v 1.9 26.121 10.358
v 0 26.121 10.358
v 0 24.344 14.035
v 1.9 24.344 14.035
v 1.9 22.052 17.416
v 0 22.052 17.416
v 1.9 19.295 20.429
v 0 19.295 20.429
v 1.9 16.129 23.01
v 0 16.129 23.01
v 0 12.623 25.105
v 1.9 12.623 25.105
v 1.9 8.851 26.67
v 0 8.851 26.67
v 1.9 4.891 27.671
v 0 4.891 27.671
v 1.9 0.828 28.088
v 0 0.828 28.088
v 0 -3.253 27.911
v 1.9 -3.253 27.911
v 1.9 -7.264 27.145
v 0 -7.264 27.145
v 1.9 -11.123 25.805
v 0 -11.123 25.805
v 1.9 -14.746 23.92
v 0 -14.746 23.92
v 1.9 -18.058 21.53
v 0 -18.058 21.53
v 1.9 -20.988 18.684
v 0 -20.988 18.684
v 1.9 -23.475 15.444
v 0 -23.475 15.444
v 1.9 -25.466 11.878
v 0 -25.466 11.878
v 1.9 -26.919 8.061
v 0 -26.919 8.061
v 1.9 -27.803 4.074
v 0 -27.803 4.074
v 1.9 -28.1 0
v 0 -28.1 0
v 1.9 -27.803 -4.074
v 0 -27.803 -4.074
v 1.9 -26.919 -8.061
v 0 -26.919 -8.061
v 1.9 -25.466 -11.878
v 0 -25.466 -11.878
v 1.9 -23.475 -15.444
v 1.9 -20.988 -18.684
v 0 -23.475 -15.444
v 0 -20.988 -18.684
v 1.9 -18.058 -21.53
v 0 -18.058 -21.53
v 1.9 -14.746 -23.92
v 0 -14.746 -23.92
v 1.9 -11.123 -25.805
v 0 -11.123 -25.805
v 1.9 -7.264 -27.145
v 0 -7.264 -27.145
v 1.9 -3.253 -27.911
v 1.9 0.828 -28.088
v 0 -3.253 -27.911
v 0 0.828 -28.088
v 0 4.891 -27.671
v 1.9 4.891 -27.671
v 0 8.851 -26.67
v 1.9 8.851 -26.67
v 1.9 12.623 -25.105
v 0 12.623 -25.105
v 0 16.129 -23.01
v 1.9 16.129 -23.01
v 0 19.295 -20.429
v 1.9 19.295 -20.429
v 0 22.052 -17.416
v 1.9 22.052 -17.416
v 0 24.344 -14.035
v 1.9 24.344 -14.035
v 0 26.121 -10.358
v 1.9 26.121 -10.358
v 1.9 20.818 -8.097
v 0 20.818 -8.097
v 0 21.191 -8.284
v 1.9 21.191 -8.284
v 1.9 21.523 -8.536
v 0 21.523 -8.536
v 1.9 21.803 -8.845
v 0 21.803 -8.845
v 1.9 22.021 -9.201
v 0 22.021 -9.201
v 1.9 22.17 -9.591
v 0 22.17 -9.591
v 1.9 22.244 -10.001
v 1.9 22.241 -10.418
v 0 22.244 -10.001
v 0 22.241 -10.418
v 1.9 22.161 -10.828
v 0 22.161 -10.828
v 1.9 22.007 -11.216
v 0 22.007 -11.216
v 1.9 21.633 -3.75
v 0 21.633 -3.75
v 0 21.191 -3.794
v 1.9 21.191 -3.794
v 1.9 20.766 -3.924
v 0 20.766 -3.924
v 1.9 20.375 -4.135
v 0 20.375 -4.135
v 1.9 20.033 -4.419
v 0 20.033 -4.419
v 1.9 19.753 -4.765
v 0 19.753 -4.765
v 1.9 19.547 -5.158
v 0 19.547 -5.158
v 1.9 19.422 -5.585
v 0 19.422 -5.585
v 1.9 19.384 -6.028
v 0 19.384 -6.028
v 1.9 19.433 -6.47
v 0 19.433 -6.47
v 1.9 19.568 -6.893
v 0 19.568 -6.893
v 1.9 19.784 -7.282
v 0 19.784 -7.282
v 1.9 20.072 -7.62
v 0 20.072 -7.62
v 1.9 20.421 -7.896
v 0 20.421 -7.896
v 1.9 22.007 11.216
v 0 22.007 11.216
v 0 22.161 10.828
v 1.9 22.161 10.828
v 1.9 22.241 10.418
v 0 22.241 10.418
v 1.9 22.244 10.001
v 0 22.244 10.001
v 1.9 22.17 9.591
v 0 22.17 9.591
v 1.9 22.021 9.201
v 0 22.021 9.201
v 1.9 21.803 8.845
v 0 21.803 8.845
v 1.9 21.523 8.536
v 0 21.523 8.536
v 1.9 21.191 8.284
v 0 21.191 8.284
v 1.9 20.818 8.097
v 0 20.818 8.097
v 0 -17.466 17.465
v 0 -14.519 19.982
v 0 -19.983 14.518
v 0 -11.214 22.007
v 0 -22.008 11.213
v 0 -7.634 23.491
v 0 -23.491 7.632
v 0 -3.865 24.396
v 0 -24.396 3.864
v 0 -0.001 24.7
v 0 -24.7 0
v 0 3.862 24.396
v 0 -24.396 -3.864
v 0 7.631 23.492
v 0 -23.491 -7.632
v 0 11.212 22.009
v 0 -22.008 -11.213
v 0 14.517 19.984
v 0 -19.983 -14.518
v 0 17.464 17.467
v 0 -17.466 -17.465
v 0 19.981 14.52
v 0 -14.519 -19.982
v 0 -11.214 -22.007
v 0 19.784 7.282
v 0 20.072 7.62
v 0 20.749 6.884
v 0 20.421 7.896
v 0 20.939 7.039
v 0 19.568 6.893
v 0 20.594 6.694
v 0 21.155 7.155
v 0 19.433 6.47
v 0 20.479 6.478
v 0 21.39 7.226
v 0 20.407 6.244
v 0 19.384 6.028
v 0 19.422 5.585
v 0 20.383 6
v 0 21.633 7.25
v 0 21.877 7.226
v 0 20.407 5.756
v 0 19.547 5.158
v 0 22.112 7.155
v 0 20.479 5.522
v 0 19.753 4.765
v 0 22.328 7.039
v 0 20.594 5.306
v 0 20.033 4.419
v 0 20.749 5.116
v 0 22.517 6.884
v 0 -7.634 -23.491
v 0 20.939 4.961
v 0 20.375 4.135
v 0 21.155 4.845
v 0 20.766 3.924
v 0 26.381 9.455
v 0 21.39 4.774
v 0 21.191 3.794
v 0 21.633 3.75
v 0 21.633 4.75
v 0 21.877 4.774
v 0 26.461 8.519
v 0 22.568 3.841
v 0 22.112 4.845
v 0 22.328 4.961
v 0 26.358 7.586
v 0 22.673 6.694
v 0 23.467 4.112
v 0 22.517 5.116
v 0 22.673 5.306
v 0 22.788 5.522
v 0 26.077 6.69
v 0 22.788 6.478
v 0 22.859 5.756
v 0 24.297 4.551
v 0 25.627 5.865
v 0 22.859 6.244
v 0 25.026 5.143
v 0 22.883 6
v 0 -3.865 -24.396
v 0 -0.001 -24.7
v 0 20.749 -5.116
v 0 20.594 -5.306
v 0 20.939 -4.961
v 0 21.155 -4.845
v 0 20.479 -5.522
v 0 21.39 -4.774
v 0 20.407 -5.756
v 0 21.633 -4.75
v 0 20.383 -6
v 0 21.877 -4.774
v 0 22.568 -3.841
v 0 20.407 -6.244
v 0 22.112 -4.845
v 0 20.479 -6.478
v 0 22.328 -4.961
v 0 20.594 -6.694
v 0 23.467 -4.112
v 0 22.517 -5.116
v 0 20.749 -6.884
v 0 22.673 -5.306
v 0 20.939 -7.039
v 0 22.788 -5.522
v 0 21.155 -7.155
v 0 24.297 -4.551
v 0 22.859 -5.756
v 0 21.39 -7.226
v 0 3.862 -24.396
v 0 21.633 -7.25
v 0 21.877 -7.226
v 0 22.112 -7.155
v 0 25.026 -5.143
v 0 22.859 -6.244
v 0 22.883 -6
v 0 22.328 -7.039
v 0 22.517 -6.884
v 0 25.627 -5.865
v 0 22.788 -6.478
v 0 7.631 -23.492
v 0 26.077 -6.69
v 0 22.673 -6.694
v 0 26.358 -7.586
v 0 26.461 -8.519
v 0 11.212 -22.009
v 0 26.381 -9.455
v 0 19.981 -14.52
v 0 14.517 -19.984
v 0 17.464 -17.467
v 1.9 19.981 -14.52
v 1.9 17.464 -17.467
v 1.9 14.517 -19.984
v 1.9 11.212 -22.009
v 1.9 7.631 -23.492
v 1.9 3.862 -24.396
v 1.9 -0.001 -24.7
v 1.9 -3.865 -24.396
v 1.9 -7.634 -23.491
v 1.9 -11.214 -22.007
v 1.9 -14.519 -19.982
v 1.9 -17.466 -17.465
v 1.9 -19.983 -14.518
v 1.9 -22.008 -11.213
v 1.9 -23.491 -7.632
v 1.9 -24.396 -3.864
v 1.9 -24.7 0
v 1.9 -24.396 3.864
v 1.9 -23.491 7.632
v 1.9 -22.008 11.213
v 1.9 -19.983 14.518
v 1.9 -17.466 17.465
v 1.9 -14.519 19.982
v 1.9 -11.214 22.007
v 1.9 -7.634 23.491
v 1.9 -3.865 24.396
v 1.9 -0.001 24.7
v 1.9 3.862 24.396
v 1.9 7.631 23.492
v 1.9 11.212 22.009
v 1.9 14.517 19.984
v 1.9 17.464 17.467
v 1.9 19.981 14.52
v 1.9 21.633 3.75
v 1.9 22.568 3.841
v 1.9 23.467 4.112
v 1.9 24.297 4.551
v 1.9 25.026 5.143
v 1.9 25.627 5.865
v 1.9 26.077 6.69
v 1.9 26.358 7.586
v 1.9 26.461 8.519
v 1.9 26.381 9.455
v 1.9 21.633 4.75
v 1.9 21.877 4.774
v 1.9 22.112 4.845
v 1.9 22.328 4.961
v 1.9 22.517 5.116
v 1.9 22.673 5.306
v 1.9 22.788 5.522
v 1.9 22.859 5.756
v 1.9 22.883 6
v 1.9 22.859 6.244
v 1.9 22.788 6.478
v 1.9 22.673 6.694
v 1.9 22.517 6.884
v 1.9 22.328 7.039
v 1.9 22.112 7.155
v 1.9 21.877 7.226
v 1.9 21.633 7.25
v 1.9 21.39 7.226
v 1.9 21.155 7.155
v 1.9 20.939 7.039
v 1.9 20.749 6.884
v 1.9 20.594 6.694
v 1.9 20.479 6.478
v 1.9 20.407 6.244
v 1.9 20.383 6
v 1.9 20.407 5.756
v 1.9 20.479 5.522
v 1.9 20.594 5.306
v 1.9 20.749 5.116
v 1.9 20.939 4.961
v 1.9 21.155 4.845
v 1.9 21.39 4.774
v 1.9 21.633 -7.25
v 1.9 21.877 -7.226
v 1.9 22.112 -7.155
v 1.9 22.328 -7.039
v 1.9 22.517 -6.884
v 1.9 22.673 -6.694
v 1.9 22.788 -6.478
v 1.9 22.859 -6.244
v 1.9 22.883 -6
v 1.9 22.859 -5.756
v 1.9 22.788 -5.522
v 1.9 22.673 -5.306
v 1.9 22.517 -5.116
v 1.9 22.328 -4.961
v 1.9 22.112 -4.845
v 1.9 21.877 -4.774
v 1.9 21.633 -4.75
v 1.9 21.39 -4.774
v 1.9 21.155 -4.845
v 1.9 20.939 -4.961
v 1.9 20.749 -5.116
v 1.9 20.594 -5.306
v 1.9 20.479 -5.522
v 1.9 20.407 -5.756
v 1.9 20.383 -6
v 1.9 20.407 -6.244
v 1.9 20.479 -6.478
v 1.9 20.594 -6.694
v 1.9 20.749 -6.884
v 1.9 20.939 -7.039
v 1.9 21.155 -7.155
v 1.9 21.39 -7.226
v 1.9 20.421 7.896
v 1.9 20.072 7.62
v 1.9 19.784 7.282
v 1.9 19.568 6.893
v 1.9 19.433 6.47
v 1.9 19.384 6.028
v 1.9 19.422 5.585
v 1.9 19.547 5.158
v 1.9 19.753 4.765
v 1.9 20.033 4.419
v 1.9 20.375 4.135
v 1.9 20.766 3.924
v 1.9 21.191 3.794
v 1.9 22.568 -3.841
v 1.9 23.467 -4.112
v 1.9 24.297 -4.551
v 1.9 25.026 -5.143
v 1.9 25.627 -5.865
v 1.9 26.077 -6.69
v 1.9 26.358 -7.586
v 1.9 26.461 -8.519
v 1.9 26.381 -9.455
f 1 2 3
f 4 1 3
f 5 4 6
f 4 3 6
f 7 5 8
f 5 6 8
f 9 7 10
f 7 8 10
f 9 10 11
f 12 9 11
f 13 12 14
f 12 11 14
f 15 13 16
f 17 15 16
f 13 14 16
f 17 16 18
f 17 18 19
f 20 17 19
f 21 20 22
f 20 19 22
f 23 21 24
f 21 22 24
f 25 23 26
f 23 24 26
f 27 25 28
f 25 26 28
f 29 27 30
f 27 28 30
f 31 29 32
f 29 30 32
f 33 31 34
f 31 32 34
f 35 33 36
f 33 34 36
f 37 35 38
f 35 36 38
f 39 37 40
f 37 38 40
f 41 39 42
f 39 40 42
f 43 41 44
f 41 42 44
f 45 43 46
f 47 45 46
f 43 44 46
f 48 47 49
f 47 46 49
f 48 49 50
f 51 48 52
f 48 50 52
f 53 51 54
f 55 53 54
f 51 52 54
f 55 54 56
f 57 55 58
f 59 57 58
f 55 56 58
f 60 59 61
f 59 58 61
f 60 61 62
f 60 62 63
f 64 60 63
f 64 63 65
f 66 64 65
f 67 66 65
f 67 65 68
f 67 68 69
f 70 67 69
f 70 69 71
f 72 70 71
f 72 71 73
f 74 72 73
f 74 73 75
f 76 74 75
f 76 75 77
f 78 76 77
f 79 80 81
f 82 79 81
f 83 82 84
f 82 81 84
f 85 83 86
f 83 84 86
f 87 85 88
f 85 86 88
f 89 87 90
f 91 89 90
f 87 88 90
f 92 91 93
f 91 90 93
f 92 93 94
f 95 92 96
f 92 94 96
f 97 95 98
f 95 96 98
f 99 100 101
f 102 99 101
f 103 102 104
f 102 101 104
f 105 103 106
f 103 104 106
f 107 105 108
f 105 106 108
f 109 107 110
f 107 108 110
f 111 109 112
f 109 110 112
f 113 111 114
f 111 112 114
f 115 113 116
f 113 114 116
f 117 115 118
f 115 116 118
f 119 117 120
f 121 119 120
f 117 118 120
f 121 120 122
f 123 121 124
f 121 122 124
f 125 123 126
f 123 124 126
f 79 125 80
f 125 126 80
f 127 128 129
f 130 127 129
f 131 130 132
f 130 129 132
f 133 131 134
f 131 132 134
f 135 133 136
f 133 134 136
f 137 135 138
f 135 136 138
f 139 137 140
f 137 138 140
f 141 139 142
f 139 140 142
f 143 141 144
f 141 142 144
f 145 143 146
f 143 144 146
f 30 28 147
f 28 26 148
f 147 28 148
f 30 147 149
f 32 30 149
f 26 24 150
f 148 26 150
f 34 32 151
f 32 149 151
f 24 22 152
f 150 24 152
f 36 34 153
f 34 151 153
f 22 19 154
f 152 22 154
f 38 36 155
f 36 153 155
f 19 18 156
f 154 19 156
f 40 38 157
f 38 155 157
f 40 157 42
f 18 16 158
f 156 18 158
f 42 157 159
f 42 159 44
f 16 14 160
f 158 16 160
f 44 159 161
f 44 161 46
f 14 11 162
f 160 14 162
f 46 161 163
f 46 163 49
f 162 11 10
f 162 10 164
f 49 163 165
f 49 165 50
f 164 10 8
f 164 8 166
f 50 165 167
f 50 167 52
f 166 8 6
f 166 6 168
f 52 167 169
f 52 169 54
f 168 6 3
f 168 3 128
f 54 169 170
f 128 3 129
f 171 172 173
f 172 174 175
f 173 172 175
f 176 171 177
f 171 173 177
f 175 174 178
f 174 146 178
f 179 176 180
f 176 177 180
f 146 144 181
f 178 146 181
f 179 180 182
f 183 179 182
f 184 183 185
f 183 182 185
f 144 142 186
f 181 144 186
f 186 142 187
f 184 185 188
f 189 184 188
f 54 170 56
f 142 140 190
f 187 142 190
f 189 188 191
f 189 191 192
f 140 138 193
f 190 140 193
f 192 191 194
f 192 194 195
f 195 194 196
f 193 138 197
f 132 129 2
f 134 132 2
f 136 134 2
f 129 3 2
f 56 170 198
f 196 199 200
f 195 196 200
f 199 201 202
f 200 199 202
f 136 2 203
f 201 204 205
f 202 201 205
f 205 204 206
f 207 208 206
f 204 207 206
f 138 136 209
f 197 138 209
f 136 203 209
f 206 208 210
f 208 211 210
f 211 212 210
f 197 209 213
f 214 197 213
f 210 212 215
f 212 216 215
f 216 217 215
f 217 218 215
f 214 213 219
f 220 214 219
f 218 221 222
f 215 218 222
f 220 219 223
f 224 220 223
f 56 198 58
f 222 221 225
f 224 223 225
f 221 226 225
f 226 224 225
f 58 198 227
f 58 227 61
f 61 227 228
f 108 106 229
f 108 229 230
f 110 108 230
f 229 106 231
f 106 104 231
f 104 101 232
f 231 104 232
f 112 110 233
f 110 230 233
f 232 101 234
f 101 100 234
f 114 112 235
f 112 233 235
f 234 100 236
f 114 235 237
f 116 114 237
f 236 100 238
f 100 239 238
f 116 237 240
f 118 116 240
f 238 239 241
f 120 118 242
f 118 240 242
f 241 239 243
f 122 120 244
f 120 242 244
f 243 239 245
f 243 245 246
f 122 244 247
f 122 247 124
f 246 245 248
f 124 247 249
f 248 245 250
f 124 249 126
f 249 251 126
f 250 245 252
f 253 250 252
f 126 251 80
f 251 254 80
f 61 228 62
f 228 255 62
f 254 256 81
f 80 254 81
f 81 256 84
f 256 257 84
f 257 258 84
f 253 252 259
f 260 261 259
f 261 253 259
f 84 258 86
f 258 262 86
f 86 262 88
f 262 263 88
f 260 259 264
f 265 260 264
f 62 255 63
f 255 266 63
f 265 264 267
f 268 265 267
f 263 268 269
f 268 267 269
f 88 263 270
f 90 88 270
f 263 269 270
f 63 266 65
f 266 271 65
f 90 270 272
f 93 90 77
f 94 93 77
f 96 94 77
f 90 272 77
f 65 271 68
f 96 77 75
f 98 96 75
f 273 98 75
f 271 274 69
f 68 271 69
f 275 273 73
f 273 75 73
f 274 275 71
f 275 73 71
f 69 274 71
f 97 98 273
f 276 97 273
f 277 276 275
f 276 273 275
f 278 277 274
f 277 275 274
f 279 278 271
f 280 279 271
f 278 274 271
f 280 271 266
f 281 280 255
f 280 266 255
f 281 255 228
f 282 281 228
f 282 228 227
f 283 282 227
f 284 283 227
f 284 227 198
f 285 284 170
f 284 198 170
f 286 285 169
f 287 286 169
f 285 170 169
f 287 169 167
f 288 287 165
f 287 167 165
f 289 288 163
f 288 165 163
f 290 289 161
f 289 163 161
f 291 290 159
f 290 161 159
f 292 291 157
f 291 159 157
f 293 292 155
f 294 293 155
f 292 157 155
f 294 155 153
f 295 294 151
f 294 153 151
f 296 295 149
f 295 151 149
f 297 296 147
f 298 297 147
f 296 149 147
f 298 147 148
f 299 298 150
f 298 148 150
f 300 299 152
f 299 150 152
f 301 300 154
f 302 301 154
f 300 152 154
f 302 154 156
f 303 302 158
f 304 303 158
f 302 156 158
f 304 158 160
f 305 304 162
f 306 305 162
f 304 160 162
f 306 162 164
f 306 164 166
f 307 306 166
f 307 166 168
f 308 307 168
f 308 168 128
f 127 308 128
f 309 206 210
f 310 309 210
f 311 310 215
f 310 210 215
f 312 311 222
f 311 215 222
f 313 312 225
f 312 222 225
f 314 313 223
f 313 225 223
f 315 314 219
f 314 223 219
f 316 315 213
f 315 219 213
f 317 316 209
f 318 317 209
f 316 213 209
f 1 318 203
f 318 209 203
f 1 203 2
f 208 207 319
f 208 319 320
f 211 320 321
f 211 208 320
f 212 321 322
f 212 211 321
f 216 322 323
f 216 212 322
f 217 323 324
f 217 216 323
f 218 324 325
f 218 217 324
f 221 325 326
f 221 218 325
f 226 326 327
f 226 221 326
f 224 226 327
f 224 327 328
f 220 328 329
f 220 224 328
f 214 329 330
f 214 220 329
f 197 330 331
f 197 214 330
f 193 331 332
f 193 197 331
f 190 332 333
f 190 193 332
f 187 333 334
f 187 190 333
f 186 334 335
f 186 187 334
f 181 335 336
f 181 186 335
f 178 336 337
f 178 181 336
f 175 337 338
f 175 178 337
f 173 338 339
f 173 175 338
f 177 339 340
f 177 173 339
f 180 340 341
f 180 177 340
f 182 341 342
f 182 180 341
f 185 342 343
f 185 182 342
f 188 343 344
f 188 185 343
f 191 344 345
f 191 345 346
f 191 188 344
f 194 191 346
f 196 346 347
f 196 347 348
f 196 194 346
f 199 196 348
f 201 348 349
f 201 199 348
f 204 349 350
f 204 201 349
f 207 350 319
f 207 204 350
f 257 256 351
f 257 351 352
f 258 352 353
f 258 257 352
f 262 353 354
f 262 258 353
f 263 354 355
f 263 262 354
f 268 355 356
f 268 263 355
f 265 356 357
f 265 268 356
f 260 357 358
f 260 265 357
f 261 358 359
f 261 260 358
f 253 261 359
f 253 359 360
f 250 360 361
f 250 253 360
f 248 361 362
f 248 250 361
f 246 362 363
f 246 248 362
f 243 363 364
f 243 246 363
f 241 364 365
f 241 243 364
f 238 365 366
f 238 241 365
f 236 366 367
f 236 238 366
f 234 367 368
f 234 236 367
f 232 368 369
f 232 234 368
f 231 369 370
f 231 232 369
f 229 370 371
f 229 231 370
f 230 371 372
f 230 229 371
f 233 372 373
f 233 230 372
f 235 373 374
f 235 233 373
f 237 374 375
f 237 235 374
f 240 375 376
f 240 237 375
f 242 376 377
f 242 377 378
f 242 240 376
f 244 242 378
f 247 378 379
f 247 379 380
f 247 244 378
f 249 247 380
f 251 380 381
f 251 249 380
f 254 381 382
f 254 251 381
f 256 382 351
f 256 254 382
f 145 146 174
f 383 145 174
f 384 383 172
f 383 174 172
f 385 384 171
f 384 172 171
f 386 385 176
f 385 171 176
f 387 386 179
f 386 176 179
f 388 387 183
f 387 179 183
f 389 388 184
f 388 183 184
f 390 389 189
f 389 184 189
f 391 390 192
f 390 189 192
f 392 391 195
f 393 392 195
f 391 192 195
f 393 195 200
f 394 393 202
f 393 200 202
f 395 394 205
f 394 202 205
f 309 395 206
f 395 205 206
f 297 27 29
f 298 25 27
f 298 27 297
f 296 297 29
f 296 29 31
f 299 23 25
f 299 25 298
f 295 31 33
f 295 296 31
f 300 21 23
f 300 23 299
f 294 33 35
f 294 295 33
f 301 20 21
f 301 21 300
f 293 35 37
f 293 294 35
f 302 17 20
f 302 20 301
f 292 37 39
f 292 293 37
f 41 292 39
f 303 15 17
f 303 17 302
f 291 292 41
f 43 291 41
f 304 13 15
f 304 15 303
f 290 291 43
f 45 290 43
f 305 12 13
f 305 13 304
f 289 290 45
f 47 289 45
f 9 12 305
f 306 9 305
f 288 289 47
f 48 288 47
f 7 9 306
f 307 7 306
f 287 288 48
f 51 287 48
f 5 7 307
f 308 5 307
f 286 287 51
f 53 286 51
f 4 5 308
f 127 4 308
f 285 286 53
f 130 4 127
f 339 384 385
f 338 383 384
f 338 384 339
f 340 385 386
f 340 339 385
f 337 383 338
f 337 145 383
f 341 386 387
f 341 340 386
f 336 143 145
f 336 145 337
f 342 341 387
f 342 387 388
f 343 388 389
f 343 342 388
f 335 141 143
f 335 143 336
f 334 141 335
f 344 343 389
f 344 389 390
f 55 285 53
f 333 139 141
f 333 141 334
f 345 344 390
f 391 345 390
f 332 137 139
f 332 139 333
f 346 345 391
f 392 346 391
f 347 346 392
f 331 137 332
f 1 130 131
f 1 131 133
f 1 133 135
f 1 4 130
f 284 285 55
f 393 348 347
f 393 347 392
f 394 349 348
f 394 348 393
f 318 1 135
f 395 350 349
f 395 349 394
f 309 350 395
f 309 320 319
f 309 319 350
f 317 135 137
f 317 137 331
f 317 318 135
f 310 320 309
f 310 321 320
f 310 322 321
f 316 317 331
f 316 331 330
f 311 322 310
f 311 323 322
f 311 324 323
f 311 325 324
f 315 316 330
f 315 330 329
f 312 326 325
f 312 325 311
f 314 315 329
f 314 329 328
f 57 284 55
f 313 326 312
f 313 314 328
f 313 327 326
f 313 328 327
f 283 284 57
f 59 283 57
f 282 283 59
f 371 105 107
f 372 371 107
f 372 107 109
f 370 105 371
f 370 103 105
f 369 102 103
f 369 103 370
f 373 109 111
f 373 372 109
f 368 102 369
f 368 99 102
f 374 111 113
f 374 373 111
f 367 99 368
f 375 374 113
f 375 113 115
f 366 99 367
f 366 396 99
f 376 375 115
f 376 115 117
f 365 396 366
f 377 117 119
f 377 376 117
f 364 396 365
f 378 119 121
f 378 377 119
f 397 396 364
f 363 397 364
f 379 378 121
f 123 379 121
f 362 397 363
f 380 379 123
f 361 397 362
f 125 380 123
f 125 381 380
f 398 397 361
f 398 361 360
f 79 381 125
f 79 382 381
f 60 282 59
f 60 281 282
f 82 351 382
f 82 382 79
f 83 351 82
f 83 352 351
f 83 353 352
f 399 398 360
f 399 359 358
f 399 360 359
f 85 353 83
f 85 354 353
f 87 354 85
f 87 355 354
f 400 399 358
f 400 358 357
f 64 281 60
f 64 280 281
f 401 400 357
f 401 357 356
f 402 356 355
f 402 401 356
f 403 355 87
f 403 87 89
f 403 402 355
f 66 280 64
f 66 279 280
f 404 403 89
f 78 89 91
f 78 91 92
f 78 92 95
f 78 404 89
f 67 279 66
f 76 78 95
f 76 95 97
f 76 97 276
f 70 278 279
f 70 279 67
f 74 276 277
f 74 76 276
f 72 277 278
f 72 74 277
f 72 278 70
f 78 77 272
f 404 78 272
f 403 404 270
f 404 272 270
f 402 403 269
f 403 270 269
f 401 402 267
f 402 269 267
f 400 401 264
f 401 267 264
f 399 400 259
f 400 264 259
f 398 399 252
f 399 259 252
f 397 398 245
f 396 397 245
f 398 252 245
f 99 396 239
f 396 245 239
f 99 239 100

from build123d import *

# Parameters (mm, degrees)
SKETCH_1_R      = 1.25
EXTRUDE_1_DEPTH = 1.9


with BuildPart() as part:
    # Эскиз1 → Бобышка-Вытянуть1 (new body)
    with BuildSketch(Plane(origin=(0, 0, 0), x_dir=(0, 0, -1), z_dir=(1, 0, 0))):
        with BuildLine():
            ThreePointArc((-10.357624838, 26.121439618), (0, -28.1), (10.357624838, 26.121439618))
            ThreePointArc((10.357624838, 26.121439618), (5.865289545, 25.627220585), (3.75, 21.633365434))
            ThreePointArc((3.75, 21.633365434), (5.585080517, 19.421953708), (8.096970509, 20.817758491))
            ThreePointArc((8.096970509, 20.817758491), (9.392356028, 22.104521997), (11.215605485, 22.006821525))
            ThreePointArc((11.215605485, 22.006821525), (0, -24.7), (-11.215605485, 22.006821525))
            ThreePointArc((-11.215605485, 22.006821525), (-9.392356028, 22.104521997), (-8.096970509, 20.817758491))
            ThreePointArc((-8.096970509, 20.817758491), (-5.585080517, 19.421953708), (-3.75, 21.633365434))
            ThreePointArc((-3.75, 21.633365434), (-5.865289545, 25.627220585), (-10.357624838, 26.121439618))
        make_face()
        with Locations((-6, 21.633365434)):
            Circle(SKETCH_1_R, mode=Mode.SUBTRACT)
        with Locations((6, 21.633365434)):
            Circle(SKETCH_1_R, mode=Mode.SUBTRACT)
    extrude(amount=EXTRUDE_1_DEPTH)


solid = part.part
